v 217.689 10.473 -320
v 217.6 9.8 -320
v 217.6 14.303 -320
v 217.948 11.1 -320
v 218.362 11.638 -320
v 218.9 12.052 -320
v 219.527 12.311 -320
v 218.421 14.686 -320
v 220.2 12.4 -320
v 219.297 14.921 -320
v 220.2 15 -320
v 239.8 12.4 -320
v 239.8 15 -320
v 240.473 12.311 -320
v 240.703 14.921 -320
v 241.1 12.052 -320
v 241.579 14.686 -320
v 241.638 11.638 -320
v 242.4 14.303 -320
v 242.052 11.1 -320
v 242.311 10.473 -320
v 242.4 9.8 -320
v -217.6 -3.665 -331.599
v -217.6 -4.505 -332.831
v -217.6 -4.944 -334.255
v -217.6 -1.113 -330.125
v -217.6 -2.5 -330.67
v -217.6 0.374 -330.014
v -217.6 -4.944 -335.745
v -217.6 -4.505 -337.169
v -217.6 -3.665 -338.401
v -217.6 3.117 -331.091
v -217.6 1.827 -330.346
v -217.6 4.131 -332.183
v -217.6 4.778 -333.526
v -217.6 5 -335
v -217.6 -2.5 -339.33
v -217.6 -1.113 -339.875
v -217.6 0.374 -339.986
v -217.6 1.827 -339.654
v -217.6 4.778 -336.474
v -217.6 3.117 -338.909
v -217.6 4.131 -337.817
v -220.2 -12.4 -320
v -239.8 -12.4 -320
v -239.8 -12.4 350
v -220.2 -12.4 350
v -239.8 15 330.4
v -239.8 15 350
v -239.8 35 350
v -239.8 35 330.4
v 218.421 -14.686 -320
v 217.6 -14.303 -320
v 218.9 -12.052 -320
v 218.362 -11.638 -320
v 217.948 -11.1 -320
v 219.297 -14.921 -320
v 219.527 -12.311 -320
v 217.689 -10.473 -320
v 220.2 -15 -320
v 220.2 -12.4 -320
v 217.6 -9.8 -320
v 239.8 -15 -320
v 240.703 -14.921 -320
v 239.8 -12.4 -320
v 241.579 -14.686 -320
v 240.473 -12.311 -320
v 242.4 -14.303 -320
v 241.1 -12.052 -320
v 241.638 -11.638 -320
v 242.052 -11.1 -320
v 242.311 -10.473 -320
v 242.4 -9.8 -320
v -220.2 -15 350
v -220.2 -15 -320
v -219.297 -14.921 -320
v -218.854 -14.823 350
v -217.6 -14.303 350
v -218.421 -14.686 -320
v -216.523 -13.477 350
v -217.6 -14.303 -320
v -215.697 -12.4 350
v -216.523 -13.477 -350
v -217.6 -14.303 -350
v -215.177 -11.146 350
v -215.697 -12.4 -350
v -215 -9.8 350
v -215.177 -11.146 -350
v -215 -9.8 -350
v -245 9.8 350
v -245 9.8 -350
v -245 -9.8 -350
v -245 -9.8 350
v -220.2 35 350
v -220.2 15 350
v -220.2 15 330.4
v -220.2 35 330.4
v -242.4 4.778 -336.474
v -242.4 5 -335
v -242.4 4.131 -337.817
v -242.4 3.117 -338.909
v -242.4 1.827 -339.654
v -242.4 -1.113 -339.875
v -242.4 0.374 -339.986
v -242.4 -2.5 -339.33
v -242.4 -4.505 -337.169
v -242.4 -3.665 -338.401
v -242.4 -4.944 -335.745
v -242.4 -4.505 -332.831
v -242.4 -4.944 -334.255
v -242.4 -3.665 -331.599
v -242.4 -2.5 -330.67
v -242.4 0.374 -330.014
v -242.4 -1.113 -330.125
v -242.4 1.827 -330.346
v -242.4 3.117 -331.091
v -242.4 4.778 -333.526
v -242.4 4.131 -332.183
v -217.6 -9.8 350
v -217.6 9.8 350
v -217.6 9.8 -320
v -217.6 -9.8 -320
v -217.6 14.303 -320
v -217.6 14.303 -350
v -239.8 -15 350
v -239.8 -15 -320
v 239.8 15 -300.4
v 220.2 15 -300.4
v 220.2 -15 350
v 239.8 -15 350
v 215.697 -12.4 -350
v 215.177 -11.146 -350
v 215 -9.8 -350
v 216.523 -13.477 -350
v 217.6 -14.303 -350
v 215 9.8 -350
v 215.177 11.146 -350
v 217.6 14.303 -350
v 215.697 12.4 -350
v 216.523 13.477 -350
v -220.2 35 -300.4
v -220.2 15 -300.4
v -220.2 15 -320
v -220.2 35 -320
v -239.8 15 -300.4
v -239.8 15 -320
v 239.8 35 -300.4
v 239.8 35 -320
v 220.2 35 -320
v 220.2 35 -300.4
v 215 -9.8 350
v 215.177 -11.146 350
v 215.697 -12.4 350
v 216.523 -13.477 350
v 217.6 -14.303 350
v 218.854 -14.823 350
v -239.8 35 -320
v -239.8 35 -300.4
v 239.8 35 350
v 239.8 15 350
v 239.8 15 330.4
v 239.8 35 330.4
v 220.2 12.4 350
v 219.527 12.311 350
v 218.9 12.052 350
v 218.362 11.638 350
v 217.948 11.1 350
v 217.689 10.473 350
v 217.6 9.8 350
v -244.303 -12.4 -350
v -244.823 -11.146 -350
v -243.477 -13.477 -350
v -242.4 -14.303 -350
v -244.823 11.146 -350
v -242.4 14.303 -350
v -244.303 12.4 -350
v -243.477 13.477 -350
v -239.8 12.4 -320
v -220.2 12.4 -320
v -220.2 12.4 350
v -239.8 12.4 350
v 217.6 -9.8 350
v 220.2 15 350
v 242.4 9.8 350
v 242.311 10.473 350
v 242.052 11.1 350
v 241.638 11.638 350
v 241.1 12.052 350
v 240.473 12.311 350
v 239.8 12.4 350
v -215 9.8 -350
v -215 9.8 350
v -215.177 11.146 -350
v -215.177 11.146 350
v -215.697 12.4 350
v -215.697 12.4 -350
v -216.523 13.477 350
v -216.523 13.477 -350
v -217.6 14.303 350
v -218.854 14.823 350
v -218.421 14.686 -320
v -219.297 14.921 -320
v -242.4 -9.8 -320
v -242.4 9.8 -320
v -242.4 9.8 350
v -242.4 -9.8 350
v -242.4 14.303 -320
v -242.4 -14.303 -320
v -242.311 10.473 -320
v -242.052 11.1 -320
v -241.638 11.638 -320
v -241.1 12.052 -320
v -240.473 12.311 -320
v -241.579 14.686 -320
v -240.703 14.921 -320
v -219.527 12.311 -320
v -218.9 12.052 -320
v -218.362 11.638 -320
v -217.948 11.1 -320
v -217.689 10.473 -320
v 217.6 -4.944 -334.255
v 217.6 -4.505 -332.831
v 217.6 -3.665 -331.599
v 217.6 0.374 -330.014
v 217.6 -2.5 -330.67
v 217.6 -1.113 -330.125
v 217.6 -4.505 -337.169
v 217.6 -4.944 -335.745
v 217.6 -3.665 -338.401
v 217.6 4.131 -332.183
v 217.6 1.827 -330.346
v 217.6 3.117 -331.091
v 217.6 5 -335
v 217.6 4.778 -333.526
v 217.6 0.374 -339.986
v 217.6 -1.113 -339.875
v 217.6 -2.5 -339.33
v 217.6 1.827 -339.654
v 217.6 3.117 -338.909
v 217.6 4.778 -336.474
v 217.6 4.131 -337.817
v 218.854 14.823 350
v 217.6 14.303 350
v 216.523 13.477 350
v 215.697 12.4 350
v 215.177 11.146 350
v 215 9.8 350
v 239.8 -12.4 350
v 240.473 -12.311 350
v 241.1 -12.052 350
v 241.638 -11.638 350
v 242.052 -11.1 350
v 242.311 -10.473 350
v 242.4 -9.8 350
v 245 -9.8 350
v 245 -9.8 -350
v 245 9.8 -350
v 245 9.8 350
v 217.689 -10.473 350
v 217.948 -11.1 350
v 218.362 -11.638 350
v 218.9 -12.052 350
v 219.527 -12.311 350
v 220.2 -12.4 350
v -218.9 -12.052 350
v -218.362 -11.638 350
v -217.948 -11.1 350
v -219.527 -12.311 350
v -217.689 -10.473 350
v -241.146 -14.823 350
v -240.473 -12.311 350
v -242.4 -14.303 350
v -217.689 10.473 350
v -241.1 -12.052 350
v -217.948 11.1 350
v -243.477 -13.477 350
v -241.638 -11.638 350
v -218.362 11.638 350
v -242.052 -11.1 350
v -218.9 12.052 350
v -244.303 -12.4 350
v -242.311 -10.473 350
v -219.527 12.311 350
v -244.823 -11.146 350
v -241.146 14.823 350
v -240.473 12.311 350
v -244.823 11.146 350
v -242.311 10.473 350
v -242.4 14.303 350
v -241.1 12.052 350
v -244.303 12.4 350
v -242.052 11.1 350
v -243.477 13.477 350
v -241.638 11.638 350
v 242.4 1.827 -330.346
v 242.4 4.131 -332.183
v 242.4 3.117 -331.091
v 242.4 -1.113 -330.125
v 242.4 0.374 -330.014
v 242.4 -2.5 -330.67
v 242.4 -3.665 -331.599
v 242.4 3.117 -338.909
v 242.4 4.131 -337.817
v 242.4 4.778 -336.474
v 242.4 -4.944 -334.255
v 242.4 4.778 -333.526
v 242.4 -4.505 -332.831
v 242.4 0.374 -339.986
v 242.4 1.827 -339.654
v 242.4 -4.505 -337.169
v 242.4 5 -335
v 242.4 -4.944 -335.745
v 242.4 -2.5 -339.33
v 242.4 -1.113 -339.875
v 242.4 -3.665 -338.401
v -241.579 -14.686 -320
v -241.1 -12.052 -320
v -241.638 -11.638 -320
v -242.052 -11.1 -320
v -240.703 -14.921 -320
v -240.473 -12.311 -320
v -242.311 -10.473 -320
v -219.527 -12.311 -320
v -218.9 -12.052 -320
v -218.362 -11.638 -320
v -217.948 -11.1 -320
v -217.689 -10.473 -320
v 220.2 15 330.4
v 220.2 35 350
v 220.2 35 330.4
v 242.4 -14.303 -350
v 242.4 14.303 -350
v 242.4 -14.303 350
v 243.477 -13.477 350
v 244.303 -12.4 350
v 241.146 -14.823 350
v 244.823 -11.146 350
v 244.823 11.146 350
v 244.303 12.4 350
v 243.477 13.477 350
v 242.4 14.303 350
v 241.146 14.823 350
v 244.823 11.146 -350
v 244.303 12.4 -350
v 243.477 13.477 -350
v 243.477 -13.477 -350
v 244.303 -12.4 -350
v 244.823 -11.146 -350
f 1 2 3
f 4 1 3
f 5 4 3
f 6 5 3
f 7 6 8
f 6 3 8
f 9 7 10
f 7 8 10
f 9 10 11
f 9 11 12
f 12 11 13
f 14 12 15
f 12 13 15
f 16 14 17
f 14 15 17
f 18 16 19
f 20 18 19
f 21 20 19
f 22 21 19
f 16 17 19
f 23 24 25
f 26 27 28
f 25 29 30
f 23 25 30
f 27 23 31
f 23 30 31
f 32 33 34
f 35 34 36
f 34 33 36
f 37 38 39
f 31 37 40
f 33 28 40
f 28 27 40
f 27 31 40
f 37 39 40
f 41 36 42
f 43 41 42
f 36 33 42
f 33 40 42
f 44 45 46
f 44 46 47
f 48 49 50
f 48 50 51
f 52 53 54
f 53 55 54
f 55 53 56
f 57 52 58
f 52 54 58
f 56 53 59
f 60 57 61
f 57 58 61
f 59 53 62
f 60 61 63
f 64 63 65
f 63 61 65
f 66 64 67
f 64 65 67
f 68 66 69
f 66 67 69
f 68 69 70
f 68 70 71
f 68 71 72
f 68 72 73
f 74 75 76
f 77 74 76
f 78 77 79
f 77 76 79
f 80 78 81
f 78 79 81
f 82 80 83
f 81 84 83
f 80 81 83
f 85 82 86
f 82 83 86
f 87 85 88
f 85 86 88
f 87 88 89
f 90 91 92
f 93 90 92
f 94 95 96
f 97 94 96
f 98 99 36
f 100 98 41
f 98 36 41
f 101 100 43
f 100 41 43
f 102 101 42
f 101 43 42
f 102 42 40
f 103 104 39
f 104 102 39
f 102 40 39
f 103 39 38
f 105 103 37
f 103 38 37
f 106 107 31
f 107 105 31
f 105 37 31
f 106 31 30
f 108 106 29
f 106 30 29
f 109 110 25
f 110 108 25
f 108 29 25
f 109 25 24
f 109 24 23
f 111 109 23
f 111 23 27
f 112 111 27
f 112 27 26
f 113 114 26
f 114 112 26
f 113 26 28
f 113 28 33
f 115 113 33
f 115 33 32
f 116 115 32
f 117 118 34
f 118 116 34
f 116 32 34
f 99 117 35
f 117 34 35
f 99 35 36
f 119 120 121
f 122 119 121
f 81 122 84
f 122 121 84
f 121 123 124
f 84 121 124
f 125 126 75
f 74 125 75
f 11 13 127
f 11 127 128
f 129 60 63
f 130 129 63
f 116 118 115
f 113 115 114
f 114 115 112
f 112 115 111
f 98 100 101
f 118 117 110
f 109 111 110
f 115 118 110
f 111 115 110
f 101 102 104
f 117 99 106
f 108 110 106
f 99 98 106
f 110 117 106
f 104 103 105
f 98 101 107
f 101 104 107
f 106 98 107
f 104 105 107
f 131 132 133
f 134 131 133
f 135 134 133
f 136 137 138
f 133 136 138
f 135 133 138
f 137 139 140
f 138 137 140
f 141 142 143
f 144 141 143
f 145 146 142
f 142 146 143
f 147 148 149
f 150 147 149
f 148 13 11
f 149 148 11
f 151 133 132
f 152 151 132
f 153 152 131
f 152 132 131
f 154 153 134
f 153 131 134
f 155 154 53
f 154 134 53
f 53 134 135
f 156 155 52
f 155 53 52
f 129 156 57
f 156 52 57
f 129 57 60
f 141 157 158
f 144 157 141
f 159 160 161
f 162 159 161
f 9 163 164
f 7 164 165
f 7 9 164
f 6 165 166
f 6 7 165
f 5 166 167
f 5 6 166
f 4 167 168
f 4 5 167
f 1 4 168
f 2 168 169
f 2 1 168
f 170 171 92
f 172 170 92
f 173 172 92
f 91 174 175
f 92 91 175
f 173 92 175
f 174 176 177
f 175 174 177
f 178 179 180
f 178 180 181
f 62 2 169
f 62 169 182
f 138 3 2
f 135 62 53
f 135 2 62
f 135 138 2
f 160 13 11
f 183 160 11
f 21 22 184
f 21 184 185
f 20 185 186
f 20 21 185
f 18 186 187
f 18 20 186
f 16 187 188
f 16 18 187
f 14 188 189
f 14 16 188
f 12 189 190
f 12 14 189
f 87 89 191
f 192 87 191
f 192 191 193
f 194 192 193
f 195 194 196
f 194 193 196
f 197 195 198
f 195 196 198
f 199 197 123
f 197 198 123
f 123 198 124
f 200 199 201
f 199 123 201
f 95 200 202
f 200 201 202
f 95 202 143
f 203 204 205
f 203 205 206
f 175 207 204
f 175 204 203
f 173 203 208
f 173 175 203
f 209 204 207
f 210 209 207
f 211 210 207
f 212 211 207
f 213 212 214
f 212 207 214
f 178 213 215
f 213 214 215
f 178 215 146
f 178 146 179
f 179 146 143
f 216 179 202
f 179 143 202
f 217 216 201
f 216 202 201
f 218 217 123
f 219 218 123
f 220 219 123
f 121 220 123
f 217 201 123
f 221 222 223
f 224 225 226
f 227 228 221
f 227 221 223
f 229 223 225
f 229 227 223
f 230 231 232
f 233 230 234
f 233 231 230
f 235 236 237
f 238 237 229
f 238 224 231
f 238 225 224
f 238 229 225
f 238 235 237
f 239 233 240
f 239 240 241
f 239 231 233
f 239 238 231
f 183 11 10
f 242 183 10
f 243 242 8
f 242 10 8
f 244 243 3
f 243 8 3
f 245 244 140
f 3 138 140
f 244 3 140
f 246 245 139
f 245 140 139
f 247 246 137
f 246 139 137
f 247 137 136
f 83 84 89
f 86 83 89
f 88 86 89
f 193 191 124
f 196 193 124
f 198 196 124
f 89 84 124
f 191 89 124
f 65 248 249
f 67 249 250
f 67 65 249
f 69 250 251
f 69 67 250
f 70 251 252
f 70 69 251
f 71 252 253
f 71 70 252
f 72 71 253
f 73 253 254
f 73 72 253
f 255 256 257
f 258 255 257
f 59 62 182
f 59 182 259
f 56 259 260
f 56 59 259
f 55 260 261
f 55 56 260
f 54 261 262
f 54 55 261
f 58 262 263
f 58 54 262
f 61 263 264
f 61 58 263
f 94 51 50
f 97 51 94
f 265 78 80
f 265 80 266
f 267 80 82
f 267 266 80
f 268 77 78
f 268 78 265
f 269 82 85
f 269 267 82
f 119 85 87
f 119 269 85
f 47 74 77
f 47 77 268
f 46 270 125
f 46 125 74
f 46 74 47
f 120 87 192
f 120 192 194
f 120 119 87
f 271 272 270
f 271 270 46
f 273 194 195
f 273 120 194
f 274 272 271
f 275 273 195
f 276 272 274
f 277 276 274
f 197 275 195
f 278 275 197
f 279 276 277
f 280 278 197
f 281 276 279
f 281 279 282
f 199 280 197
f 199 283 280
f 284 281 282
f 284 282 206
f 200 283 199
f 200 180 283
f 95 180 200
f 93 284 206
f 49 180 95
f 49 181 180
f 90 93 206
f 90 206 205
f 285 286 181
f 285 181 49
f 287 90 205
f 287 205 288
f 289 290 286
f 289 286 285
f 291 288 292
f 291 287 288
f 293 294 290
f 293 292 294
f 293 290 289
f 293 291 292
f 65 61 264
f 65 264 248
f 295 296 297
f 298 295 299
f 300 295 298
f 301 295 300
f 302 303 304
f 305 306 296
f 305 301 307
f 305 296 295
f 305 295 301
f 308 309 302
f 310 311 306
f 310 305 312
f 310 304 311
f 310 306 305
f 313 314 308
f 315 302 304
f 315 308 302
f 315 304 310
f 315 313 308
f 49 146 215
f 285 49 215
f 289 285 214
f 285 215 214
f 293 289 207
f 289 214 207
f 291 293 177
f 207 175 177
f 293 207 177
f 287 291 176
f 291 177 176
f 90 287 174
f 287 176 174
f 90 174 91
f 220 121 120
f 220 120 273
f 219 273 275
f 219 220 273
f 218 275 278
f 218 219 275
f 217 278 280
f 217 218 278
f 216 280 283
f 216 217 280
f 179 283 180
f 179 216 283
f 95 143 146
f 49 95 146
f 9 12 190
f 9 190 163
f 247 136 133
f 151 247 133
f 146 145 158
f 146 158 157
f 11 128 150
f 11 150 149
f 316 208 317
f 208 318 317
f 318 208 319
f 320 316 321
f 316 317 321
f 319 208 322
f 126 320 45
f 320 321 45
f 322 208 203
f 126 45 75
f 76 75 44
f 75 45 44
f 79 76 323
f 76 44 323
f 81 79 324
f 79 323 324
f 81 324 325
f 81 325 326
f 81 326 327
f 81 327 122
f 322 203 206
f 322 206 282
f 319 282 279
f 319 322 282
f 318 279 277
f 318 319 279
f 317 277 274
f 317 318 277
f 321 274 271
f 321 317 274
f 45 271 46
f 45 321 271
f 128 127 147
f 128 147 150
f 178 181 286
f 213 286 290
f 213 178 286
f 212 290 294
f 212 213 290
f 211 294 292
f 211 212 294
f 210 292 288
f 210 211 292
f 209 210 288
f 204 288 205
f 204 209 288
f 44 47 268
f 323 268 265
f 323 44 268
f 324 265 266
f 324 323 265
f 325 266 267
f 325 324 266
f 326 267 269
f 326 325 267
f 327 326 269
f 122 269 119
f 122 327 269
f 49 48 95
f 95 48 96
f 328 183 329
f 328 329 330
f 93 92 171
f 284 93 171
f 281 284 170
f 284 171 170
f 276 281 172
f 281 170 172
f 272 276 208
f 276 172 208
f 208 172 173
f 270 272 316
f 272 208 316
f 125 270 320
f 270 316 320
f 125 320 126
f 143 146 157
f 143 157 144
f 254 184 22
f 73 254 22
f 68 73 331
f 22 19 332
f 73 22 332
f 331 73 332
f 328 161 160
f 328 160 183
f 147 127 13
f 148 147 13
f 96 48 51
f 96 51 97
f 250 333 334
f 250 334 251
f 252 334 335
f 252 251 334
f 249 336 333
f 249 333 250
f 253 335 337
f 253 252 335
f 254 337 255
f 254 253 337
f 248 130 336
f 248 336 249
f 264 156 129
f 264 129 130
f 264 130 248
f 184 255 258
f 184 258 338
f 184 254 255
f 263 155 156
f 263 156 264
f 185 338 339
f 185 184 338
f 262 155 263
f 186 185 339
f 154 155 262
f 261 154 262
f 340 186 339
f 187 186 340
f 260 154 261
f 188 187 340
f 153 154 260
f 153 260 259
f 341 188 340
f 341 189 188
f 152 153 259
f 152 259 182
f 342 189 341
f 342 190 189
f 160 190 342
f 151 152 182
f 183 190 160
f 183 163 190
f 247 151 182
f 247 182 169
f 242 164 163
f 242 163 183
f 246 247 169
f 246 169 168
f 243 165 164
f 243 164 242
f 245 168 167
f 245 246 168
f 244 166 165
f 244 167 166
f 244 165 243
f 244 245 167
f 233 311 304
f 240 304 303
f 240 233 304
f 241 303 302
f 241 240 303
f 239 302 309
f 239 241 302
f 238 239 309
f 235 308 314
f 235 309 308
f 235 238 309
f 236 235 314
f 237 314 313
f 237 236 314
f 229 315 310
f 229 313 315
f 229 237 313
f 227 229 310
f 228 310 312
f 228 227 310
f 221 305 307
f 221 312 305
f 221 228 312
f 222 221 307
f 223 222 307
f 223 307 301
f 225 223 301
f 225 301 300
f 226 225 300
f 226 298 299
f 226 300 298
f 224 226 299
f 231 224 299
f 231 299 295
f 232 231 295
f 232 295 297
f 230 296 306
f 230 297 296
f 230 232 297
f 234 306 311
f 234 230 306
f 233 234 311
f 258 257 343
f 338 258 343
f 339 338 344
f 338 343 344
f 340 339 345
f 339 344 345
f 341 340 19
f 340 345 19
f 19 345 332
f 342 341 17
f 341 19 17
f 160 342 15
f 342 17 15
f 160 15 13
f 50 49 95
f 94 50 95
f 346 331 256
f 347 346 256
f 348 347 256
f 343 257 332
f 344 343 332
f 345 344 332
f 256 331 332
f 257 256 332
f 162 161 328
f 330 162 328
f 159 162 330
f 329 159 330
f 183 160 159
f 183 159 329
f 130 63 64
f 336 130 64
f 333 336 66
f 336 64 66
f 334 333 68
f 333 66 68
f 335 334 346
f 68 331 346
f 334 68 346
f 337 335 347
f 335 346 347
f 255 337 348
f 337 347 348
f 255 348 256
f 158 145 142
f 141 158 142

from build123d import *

# Parameters (mm, degrees)
SQUARE_TUBE_CONFIGURED_30_X_30_X_2_6_4_DEPTH = 700
SQUARE_TUBE_CONFIGURED_30_X_30_X_2_2_DEPTH   = 700
SKETCH113_W                                  = 24.8
SKETCH113_H                                  = 30
CUT_EXTRUDE1_DEPTH                           = 429.281449517
BOSS_EXTRUDE1_REACH                          = 582.279
SKETCH114_R                                  = 5
SKETCH115_W                                  = 24.8
SKETCH115_H                                  = 30
CUT_EXTRUDE2_DEPTH                           = 429.281449517
SKETCH117_W                                  = 19.6
SKETCH117_H                                  = 19.6
BOSS_EXTRUDE2_DEPTH                          = 20
SKETCH118_W                                  = 19.6
SKETCH118_H                                  = 19.6
BOSS_EXTRUDE3_DEPTH                          = 20


with BuildPart() as part:
    # Sketch116 → Square tube - configured 30 X 30 X 2.6(4) (new body)
    with BuildSketch(Plane(origin=(-230, 0, -350), x_dir=(0, 1, 0), z_dir=(0, 0, 1))):
        with BuildLine():
            Line((-9.8, -15), (9.8, -15))
            ThreePointArc((9.8, -15), (13.476955262, -13.476955262), (15, -9.8))
            Line((15, -9.8), (15, 9.8))
            ThreePointArc((15, 9.8), (13.476955262, 13.476955262), (9.8, 15))
            Line((9.8, 15), (-9.8, 15))
            ThreePointArc((-9.8, 15), (-13.476955262, 13.476955262), (-15, 9.8))
            Line((-15, 9.8), (-15, -9.8))
            ThreePointArc((-15, -9.8), (-13.476955262, -13.476955262), (-9.8, -15))
        make_face()
        with BuildLine():
            Line((-9.8, -12.4), (9.8, -12.4))
            ThreePointArc((9.8, -12.4), (11.638477631, -11.638477631), (12.4, -9.8))
            Line((12.4, -9.8), (12.4, 9.8))
            ThreePointArc((12.4, 9.8), (11.638477631, 11.638477631), (9.8, 12.4))
            Line((9.8, 12.4), (-9.8, 12.4))
            ThreePointArc((-9.8, 12.4), (-11.638477631, 11.638477631), (-12.4, 9.8))
            Line((-12.4, 9.8), (-12.4, -9.8))
            ThreePointArc((-12.4, -9.8), (-11.638477631, -11.638477631), (-9.8, -12.4))
        make_face(mode=Mode.SUBTRACT)
    extrude(amount=SQUARE_TUBE_CONFIGURED_30_X_30_X_2_6_4_DEPTH)

    # Sketch113 → Cut-Extrude1 (cut, through all)
    with BuildSketch(Plane(origin=(0, 15, 0), x_dir=(1, 0, 0), z_dir=(0, 1, 0))):
        with Locations((-230, 335)):
            Rectangle(SKETCH113_W, SKETCH113_H)
    extrude(amount=-CUT_EXTRUDE1_DEPTH, mode=Mode.SUBTRACT)


with BuildPart() as body_2:
    # Sketch116 on segment 2 (carried to segment 2) → Square tube - configured 30 X 30 X 2 2 (new body)
    with BuildSketch(Plane(origin=(230, 0, -350), x_dir=(0, 1, 0), z_dir=(0, 0, 1))):
        with BuildLine():
            Line((-9.8, -15), (9.8, -15))
            ThreePointArc((9.8, -15), (13.476955262, -13.476955262), (15, -9.8))
            Line((15, -9.8), (15, 9.8))
            ThreePointArc((15, 9.8), (13.476955262, 13.476955262), (9.8, 15))
            Line((9.8, 15), (-9.8, 15))
            ThreePointArc((-9.8, 15), (-13.476955262, 13.476955262), (-15, 9.8))
            Line((-15, 9.8), (-15, -9.8))
            ThreePointArc((-15, -9.8), (-13.476955262, -13.476955262), (-9.8, -15))
        make_face()
        with BuildLine():
            Line((-9.8, -12.4), (9.8, -12.4))
            ThreePointArc((9.8, -12.4), (11.638477631, -11.638477631), (12.4, -9.8))
            Line((12.4, -9.8), (12.4, 9.8))
            ThreePointArc((12.4, 9.8), (11.638477631, 11.638477631), (9.8, 12.4))
            Line((9.8, 12.4), (-9.8, 12.4))
            ThreePointArc((-9.8, 12.4), (-11.638477631, 11.638477631), (-12.4, 9.8))
            Line((-12.4, 9.8), (-12.4, -9.8))
            ThreePointArc((-12.4, -9.8), (-11.638477631, -11.638477631), (-9.8, -12.4))
        make_face(mode=Mode.SUBTRACT)
    extrude(amount=SQUARE_TUBE_CONFIGURED_30_X_30_X_2_2_DEPTH)

    # Sketch115 → Cut-Extrude2 (cut, through all)
    with BuildSketch(Plane(origin=(0, 15, 0), x_dir=(1, 0, 0), z_dir=(0, 1, 0))):
        with Locations((230, 335)):
            Rectangle(SKETCH115_W, SKETCH115_H)
    extrude(amount=-CUT_EXTRUDE2_DEPTH, mode=Mode.SUBTRACT)


with BuildPart() as body_3:

    # Sketch114 → Boss-Extrude1 (new, up to next)
    with BuildSketch(Plane.ZY.offset(217.6), mode=Mode.PRIVATE) as boss_extrude1_sk1:
        with Locations(Location((-335, 0, 0), (0, 0, 90))):
            Circle(SKETCH114_R)
    boss_extrude1_tool1 = extrude(boss_extrude1_sk1.sketch, amount=BOSS_EXTRUDE1_REACH, mode=Mode.PRIVATE) - part.part
    add(boss_extrude1_tool1.solids().sort_by_distance((-217.6, 0, -335))[0])


with BuildPart() as body_4:
    # Mirror8: mirrored copy
    add(body_3.part.mirror(Plane(origin=(0, 0, 0), x_dir=(0, 0, 1), z_dir=(1, 0, 0))))


with BuildPart() as body_5:
    # Sketch117 → Boss-Extrude2 (new body)
    with BuildSketch(Plane(origin=(0, 15, 0), x_dir=(1, 0, 0), z_dir=(0, 1, 0))):
        with Locations((-230, -340.2)):
            Rectangle(SKETCH117_W, SKETCH117_H)
    extrude(amount=BOSS_EXTRUDE2_DEPTH)


with BuildPart() as body_6:
    # Mirror9: mirrored copy
    add(body_5.part.mirror(Plane(origin=(0, 0, 0), x_dir=(0, 0, 1), z_dir=(1, 0, 0))))


with BuildPart() as body_7:
    # Sketch118 → Boss-Extrude3 (new body)
    with BuildSketch(Plane(origin=(0, 15, 0), x_dir=(1, 0, 0), z_dir=(0, 1, 0))):
        with Locations((-230, 310.2)):
            Rectangle(SKETCH118_W, SKETCH118_H)
    extrude(amount=BOSS_EXTRUDE3_DEPTH)


with BuildPart() as body_8:
    # Mirror10: mirrored copy
    add(body_7.part.mirror(Plane(origin=(0, 0, 0), x_dir=(0, 0, 1), z_dir=(1, 0, 0))))


solid = Compound([part.part, body_2.part, body_3.part, body_4.part, body_5.part, body_6.part, body_7.part, body_8.part])
